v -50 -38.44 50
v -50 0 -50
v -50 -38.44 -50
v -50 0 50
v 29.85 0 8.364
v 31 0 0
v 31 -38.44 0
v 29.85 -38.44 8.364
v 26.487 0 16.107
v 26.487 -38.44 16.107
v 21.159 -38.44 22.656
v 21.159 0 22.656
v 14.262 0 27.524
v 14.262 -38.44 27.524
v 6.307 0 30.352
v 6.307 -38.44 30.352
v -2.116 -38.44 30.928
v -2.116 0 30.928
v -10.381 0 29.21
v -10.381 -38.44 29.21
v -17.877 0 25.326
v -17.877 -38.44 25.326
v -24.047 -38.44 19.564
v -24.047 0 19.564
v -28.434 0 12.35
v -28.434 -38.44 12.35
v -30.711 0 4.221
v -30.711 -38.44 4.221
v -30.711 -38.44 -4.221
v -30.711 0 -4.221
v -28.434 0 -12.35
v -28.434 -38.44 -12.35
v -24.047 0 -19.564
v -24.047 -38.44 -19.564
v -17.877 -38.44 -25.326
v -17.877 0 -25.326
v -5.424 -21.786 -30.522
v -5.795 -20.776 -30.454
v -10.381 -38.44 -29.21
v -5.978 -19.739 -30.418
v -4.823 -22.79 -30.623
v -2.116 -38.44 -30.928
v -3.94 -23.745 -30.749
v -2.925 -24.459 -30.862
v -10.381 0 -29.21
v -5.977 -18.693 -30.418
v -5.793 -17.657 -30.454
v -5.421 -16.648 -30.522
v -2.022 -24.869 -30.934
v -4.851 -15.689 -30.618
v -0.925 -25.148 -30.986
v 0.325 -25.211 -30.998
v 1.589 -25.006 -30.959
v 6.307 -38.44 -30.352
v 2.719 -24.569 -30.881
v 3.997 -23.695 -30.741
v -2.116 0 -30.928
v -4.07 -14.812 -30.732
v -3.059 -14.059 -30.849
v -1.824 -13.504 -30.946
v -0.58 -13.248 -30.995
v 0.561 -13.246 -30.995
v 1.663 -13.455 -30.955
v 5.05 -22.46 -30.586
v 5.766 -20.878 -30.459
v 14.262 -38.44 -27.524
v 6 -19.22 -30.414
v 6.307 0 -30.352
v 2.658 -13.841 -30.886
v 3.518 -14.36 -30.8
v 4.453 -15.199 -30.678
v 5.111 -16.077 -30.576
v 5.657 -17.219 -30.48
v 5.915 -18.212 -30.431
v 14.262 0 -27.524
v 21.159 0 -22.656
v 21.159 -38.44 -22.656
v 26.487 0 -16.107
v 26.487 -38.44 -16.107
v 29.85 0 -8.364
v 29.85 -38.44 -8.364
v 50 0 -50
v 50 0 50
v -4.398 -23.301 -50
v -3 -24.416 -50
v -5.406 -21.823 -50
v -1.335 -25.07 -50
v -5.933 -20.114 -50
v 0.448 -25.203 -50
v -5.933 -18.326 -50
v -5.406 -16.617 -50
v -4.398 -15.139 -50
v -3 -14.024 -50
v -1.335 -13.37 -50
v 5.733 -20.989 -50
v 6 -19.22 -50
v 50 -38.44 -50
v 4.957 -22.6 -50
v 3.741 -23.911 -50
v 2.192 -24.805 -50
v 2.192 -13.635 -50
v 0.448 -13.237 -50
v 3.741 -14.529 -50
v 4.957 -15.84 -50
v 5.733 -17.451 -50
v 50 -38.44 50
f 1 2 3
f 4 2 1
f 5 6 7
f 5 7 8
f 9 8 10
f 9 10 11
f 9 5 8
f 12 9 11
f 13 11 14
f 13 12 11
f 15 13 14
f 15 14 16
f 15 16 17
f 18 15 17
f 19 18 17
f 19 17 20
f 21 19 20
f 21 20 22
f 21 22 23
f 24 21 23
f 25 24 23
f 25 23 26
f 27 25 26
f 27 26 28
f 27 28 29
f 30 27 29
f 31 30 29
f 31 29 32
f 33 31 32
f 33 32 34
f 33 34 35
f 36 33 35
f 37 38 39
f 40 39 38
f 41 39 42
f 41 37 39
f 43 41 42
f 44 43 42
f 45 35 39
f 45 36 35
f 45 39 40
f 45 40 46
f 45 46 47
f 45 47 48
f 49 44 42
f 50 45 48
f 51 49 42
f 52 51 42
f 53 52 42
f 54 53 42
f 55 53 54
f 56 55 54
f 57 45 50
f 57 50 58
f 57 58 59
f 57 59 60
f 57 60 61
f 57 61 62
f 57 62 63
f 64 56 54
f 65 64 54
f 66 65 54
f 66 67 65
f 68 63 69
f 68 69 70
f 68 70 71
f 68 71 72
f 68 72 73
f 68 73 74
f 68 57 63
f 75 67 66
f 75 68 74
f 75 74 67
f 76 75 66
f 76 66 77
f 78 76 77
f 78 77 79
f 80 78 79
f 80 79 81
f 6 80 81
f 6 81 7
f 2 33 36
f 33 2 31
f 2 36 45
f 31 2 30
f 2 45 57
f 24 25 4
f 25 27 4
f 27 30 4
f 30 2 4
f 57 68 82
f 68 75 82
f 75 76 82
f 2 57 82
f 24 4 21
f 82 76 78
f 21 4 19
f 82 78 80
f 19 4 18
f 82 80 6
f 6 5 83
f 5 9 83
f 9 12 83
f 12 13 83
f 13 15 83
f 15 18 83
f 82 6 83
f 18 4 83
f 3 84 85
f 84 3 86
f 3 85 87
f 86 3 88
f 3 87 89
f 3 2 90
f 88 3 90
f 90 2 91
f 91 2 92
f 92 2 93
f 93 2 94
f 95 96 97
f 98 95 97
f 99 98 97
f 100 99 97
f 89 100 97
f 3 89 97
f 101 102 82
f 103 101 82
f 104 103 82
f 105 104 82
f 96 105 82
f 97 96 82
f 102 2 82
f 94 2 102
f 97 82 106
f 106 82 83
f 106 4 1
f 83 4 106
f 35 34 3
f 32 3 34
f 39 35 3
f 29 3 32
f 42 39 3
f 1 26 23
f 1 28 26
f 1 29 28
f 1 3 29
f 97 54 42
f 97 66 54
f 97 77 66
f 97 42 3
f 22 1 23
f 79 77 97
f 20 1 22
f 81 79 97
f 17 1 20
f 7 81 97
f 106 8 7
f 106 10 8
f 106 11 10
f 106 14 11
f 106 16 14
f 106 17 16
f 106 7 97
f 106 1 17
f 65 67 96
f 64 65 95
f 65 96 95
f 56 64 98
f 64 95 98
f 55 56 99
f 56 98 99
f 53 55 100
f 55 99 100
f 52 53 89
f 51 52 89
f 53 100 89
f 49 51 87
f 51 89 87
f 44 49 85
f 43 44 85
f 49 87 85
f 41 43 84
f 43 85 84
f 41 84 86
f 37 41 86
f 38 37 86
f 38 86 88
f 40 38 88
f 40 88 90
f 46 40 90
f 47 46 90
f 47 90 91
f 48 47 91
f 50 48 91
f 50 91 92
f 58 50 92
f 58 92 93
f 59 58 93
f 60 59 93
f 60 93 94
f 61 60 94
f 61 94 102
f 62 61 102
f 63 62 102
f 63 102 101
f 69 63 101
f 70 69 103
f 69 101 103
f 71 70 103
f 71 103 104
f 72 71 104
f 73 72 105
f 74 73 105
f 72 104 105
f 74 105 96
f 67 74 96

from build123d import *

# Parameters (mm, degrees)
F0_W     = 100
F0_H     = 100
F0_R     = 31
F1_DEPTH = 38.44
F2_R     = 6
F3_DEPTH = 19.5871874485


with BuildPart() as f1:
    # F0 (on Front) → F1 (new body)
    with BuildSketch(Plane.XZ):
        Rectangle(F0_W, F0_H)
        Circle(F0_R, mode=Mode.SUBTRACT)
    extrude(amount=F1_DEPTH)

    # F2 (on face) → F3 (cut, through all)
    with BuildSketch(Plane(origin=(0, 0, -50), x_dir=(1, 0, 0), z_dir=(0, 0, -1))):
        with Locations((0, 19.22)):
            Circle(F2_R)
    extrude(amount=-F3_DEPTH, mode=Mode.SUBTRACT)


solid = f1.part
